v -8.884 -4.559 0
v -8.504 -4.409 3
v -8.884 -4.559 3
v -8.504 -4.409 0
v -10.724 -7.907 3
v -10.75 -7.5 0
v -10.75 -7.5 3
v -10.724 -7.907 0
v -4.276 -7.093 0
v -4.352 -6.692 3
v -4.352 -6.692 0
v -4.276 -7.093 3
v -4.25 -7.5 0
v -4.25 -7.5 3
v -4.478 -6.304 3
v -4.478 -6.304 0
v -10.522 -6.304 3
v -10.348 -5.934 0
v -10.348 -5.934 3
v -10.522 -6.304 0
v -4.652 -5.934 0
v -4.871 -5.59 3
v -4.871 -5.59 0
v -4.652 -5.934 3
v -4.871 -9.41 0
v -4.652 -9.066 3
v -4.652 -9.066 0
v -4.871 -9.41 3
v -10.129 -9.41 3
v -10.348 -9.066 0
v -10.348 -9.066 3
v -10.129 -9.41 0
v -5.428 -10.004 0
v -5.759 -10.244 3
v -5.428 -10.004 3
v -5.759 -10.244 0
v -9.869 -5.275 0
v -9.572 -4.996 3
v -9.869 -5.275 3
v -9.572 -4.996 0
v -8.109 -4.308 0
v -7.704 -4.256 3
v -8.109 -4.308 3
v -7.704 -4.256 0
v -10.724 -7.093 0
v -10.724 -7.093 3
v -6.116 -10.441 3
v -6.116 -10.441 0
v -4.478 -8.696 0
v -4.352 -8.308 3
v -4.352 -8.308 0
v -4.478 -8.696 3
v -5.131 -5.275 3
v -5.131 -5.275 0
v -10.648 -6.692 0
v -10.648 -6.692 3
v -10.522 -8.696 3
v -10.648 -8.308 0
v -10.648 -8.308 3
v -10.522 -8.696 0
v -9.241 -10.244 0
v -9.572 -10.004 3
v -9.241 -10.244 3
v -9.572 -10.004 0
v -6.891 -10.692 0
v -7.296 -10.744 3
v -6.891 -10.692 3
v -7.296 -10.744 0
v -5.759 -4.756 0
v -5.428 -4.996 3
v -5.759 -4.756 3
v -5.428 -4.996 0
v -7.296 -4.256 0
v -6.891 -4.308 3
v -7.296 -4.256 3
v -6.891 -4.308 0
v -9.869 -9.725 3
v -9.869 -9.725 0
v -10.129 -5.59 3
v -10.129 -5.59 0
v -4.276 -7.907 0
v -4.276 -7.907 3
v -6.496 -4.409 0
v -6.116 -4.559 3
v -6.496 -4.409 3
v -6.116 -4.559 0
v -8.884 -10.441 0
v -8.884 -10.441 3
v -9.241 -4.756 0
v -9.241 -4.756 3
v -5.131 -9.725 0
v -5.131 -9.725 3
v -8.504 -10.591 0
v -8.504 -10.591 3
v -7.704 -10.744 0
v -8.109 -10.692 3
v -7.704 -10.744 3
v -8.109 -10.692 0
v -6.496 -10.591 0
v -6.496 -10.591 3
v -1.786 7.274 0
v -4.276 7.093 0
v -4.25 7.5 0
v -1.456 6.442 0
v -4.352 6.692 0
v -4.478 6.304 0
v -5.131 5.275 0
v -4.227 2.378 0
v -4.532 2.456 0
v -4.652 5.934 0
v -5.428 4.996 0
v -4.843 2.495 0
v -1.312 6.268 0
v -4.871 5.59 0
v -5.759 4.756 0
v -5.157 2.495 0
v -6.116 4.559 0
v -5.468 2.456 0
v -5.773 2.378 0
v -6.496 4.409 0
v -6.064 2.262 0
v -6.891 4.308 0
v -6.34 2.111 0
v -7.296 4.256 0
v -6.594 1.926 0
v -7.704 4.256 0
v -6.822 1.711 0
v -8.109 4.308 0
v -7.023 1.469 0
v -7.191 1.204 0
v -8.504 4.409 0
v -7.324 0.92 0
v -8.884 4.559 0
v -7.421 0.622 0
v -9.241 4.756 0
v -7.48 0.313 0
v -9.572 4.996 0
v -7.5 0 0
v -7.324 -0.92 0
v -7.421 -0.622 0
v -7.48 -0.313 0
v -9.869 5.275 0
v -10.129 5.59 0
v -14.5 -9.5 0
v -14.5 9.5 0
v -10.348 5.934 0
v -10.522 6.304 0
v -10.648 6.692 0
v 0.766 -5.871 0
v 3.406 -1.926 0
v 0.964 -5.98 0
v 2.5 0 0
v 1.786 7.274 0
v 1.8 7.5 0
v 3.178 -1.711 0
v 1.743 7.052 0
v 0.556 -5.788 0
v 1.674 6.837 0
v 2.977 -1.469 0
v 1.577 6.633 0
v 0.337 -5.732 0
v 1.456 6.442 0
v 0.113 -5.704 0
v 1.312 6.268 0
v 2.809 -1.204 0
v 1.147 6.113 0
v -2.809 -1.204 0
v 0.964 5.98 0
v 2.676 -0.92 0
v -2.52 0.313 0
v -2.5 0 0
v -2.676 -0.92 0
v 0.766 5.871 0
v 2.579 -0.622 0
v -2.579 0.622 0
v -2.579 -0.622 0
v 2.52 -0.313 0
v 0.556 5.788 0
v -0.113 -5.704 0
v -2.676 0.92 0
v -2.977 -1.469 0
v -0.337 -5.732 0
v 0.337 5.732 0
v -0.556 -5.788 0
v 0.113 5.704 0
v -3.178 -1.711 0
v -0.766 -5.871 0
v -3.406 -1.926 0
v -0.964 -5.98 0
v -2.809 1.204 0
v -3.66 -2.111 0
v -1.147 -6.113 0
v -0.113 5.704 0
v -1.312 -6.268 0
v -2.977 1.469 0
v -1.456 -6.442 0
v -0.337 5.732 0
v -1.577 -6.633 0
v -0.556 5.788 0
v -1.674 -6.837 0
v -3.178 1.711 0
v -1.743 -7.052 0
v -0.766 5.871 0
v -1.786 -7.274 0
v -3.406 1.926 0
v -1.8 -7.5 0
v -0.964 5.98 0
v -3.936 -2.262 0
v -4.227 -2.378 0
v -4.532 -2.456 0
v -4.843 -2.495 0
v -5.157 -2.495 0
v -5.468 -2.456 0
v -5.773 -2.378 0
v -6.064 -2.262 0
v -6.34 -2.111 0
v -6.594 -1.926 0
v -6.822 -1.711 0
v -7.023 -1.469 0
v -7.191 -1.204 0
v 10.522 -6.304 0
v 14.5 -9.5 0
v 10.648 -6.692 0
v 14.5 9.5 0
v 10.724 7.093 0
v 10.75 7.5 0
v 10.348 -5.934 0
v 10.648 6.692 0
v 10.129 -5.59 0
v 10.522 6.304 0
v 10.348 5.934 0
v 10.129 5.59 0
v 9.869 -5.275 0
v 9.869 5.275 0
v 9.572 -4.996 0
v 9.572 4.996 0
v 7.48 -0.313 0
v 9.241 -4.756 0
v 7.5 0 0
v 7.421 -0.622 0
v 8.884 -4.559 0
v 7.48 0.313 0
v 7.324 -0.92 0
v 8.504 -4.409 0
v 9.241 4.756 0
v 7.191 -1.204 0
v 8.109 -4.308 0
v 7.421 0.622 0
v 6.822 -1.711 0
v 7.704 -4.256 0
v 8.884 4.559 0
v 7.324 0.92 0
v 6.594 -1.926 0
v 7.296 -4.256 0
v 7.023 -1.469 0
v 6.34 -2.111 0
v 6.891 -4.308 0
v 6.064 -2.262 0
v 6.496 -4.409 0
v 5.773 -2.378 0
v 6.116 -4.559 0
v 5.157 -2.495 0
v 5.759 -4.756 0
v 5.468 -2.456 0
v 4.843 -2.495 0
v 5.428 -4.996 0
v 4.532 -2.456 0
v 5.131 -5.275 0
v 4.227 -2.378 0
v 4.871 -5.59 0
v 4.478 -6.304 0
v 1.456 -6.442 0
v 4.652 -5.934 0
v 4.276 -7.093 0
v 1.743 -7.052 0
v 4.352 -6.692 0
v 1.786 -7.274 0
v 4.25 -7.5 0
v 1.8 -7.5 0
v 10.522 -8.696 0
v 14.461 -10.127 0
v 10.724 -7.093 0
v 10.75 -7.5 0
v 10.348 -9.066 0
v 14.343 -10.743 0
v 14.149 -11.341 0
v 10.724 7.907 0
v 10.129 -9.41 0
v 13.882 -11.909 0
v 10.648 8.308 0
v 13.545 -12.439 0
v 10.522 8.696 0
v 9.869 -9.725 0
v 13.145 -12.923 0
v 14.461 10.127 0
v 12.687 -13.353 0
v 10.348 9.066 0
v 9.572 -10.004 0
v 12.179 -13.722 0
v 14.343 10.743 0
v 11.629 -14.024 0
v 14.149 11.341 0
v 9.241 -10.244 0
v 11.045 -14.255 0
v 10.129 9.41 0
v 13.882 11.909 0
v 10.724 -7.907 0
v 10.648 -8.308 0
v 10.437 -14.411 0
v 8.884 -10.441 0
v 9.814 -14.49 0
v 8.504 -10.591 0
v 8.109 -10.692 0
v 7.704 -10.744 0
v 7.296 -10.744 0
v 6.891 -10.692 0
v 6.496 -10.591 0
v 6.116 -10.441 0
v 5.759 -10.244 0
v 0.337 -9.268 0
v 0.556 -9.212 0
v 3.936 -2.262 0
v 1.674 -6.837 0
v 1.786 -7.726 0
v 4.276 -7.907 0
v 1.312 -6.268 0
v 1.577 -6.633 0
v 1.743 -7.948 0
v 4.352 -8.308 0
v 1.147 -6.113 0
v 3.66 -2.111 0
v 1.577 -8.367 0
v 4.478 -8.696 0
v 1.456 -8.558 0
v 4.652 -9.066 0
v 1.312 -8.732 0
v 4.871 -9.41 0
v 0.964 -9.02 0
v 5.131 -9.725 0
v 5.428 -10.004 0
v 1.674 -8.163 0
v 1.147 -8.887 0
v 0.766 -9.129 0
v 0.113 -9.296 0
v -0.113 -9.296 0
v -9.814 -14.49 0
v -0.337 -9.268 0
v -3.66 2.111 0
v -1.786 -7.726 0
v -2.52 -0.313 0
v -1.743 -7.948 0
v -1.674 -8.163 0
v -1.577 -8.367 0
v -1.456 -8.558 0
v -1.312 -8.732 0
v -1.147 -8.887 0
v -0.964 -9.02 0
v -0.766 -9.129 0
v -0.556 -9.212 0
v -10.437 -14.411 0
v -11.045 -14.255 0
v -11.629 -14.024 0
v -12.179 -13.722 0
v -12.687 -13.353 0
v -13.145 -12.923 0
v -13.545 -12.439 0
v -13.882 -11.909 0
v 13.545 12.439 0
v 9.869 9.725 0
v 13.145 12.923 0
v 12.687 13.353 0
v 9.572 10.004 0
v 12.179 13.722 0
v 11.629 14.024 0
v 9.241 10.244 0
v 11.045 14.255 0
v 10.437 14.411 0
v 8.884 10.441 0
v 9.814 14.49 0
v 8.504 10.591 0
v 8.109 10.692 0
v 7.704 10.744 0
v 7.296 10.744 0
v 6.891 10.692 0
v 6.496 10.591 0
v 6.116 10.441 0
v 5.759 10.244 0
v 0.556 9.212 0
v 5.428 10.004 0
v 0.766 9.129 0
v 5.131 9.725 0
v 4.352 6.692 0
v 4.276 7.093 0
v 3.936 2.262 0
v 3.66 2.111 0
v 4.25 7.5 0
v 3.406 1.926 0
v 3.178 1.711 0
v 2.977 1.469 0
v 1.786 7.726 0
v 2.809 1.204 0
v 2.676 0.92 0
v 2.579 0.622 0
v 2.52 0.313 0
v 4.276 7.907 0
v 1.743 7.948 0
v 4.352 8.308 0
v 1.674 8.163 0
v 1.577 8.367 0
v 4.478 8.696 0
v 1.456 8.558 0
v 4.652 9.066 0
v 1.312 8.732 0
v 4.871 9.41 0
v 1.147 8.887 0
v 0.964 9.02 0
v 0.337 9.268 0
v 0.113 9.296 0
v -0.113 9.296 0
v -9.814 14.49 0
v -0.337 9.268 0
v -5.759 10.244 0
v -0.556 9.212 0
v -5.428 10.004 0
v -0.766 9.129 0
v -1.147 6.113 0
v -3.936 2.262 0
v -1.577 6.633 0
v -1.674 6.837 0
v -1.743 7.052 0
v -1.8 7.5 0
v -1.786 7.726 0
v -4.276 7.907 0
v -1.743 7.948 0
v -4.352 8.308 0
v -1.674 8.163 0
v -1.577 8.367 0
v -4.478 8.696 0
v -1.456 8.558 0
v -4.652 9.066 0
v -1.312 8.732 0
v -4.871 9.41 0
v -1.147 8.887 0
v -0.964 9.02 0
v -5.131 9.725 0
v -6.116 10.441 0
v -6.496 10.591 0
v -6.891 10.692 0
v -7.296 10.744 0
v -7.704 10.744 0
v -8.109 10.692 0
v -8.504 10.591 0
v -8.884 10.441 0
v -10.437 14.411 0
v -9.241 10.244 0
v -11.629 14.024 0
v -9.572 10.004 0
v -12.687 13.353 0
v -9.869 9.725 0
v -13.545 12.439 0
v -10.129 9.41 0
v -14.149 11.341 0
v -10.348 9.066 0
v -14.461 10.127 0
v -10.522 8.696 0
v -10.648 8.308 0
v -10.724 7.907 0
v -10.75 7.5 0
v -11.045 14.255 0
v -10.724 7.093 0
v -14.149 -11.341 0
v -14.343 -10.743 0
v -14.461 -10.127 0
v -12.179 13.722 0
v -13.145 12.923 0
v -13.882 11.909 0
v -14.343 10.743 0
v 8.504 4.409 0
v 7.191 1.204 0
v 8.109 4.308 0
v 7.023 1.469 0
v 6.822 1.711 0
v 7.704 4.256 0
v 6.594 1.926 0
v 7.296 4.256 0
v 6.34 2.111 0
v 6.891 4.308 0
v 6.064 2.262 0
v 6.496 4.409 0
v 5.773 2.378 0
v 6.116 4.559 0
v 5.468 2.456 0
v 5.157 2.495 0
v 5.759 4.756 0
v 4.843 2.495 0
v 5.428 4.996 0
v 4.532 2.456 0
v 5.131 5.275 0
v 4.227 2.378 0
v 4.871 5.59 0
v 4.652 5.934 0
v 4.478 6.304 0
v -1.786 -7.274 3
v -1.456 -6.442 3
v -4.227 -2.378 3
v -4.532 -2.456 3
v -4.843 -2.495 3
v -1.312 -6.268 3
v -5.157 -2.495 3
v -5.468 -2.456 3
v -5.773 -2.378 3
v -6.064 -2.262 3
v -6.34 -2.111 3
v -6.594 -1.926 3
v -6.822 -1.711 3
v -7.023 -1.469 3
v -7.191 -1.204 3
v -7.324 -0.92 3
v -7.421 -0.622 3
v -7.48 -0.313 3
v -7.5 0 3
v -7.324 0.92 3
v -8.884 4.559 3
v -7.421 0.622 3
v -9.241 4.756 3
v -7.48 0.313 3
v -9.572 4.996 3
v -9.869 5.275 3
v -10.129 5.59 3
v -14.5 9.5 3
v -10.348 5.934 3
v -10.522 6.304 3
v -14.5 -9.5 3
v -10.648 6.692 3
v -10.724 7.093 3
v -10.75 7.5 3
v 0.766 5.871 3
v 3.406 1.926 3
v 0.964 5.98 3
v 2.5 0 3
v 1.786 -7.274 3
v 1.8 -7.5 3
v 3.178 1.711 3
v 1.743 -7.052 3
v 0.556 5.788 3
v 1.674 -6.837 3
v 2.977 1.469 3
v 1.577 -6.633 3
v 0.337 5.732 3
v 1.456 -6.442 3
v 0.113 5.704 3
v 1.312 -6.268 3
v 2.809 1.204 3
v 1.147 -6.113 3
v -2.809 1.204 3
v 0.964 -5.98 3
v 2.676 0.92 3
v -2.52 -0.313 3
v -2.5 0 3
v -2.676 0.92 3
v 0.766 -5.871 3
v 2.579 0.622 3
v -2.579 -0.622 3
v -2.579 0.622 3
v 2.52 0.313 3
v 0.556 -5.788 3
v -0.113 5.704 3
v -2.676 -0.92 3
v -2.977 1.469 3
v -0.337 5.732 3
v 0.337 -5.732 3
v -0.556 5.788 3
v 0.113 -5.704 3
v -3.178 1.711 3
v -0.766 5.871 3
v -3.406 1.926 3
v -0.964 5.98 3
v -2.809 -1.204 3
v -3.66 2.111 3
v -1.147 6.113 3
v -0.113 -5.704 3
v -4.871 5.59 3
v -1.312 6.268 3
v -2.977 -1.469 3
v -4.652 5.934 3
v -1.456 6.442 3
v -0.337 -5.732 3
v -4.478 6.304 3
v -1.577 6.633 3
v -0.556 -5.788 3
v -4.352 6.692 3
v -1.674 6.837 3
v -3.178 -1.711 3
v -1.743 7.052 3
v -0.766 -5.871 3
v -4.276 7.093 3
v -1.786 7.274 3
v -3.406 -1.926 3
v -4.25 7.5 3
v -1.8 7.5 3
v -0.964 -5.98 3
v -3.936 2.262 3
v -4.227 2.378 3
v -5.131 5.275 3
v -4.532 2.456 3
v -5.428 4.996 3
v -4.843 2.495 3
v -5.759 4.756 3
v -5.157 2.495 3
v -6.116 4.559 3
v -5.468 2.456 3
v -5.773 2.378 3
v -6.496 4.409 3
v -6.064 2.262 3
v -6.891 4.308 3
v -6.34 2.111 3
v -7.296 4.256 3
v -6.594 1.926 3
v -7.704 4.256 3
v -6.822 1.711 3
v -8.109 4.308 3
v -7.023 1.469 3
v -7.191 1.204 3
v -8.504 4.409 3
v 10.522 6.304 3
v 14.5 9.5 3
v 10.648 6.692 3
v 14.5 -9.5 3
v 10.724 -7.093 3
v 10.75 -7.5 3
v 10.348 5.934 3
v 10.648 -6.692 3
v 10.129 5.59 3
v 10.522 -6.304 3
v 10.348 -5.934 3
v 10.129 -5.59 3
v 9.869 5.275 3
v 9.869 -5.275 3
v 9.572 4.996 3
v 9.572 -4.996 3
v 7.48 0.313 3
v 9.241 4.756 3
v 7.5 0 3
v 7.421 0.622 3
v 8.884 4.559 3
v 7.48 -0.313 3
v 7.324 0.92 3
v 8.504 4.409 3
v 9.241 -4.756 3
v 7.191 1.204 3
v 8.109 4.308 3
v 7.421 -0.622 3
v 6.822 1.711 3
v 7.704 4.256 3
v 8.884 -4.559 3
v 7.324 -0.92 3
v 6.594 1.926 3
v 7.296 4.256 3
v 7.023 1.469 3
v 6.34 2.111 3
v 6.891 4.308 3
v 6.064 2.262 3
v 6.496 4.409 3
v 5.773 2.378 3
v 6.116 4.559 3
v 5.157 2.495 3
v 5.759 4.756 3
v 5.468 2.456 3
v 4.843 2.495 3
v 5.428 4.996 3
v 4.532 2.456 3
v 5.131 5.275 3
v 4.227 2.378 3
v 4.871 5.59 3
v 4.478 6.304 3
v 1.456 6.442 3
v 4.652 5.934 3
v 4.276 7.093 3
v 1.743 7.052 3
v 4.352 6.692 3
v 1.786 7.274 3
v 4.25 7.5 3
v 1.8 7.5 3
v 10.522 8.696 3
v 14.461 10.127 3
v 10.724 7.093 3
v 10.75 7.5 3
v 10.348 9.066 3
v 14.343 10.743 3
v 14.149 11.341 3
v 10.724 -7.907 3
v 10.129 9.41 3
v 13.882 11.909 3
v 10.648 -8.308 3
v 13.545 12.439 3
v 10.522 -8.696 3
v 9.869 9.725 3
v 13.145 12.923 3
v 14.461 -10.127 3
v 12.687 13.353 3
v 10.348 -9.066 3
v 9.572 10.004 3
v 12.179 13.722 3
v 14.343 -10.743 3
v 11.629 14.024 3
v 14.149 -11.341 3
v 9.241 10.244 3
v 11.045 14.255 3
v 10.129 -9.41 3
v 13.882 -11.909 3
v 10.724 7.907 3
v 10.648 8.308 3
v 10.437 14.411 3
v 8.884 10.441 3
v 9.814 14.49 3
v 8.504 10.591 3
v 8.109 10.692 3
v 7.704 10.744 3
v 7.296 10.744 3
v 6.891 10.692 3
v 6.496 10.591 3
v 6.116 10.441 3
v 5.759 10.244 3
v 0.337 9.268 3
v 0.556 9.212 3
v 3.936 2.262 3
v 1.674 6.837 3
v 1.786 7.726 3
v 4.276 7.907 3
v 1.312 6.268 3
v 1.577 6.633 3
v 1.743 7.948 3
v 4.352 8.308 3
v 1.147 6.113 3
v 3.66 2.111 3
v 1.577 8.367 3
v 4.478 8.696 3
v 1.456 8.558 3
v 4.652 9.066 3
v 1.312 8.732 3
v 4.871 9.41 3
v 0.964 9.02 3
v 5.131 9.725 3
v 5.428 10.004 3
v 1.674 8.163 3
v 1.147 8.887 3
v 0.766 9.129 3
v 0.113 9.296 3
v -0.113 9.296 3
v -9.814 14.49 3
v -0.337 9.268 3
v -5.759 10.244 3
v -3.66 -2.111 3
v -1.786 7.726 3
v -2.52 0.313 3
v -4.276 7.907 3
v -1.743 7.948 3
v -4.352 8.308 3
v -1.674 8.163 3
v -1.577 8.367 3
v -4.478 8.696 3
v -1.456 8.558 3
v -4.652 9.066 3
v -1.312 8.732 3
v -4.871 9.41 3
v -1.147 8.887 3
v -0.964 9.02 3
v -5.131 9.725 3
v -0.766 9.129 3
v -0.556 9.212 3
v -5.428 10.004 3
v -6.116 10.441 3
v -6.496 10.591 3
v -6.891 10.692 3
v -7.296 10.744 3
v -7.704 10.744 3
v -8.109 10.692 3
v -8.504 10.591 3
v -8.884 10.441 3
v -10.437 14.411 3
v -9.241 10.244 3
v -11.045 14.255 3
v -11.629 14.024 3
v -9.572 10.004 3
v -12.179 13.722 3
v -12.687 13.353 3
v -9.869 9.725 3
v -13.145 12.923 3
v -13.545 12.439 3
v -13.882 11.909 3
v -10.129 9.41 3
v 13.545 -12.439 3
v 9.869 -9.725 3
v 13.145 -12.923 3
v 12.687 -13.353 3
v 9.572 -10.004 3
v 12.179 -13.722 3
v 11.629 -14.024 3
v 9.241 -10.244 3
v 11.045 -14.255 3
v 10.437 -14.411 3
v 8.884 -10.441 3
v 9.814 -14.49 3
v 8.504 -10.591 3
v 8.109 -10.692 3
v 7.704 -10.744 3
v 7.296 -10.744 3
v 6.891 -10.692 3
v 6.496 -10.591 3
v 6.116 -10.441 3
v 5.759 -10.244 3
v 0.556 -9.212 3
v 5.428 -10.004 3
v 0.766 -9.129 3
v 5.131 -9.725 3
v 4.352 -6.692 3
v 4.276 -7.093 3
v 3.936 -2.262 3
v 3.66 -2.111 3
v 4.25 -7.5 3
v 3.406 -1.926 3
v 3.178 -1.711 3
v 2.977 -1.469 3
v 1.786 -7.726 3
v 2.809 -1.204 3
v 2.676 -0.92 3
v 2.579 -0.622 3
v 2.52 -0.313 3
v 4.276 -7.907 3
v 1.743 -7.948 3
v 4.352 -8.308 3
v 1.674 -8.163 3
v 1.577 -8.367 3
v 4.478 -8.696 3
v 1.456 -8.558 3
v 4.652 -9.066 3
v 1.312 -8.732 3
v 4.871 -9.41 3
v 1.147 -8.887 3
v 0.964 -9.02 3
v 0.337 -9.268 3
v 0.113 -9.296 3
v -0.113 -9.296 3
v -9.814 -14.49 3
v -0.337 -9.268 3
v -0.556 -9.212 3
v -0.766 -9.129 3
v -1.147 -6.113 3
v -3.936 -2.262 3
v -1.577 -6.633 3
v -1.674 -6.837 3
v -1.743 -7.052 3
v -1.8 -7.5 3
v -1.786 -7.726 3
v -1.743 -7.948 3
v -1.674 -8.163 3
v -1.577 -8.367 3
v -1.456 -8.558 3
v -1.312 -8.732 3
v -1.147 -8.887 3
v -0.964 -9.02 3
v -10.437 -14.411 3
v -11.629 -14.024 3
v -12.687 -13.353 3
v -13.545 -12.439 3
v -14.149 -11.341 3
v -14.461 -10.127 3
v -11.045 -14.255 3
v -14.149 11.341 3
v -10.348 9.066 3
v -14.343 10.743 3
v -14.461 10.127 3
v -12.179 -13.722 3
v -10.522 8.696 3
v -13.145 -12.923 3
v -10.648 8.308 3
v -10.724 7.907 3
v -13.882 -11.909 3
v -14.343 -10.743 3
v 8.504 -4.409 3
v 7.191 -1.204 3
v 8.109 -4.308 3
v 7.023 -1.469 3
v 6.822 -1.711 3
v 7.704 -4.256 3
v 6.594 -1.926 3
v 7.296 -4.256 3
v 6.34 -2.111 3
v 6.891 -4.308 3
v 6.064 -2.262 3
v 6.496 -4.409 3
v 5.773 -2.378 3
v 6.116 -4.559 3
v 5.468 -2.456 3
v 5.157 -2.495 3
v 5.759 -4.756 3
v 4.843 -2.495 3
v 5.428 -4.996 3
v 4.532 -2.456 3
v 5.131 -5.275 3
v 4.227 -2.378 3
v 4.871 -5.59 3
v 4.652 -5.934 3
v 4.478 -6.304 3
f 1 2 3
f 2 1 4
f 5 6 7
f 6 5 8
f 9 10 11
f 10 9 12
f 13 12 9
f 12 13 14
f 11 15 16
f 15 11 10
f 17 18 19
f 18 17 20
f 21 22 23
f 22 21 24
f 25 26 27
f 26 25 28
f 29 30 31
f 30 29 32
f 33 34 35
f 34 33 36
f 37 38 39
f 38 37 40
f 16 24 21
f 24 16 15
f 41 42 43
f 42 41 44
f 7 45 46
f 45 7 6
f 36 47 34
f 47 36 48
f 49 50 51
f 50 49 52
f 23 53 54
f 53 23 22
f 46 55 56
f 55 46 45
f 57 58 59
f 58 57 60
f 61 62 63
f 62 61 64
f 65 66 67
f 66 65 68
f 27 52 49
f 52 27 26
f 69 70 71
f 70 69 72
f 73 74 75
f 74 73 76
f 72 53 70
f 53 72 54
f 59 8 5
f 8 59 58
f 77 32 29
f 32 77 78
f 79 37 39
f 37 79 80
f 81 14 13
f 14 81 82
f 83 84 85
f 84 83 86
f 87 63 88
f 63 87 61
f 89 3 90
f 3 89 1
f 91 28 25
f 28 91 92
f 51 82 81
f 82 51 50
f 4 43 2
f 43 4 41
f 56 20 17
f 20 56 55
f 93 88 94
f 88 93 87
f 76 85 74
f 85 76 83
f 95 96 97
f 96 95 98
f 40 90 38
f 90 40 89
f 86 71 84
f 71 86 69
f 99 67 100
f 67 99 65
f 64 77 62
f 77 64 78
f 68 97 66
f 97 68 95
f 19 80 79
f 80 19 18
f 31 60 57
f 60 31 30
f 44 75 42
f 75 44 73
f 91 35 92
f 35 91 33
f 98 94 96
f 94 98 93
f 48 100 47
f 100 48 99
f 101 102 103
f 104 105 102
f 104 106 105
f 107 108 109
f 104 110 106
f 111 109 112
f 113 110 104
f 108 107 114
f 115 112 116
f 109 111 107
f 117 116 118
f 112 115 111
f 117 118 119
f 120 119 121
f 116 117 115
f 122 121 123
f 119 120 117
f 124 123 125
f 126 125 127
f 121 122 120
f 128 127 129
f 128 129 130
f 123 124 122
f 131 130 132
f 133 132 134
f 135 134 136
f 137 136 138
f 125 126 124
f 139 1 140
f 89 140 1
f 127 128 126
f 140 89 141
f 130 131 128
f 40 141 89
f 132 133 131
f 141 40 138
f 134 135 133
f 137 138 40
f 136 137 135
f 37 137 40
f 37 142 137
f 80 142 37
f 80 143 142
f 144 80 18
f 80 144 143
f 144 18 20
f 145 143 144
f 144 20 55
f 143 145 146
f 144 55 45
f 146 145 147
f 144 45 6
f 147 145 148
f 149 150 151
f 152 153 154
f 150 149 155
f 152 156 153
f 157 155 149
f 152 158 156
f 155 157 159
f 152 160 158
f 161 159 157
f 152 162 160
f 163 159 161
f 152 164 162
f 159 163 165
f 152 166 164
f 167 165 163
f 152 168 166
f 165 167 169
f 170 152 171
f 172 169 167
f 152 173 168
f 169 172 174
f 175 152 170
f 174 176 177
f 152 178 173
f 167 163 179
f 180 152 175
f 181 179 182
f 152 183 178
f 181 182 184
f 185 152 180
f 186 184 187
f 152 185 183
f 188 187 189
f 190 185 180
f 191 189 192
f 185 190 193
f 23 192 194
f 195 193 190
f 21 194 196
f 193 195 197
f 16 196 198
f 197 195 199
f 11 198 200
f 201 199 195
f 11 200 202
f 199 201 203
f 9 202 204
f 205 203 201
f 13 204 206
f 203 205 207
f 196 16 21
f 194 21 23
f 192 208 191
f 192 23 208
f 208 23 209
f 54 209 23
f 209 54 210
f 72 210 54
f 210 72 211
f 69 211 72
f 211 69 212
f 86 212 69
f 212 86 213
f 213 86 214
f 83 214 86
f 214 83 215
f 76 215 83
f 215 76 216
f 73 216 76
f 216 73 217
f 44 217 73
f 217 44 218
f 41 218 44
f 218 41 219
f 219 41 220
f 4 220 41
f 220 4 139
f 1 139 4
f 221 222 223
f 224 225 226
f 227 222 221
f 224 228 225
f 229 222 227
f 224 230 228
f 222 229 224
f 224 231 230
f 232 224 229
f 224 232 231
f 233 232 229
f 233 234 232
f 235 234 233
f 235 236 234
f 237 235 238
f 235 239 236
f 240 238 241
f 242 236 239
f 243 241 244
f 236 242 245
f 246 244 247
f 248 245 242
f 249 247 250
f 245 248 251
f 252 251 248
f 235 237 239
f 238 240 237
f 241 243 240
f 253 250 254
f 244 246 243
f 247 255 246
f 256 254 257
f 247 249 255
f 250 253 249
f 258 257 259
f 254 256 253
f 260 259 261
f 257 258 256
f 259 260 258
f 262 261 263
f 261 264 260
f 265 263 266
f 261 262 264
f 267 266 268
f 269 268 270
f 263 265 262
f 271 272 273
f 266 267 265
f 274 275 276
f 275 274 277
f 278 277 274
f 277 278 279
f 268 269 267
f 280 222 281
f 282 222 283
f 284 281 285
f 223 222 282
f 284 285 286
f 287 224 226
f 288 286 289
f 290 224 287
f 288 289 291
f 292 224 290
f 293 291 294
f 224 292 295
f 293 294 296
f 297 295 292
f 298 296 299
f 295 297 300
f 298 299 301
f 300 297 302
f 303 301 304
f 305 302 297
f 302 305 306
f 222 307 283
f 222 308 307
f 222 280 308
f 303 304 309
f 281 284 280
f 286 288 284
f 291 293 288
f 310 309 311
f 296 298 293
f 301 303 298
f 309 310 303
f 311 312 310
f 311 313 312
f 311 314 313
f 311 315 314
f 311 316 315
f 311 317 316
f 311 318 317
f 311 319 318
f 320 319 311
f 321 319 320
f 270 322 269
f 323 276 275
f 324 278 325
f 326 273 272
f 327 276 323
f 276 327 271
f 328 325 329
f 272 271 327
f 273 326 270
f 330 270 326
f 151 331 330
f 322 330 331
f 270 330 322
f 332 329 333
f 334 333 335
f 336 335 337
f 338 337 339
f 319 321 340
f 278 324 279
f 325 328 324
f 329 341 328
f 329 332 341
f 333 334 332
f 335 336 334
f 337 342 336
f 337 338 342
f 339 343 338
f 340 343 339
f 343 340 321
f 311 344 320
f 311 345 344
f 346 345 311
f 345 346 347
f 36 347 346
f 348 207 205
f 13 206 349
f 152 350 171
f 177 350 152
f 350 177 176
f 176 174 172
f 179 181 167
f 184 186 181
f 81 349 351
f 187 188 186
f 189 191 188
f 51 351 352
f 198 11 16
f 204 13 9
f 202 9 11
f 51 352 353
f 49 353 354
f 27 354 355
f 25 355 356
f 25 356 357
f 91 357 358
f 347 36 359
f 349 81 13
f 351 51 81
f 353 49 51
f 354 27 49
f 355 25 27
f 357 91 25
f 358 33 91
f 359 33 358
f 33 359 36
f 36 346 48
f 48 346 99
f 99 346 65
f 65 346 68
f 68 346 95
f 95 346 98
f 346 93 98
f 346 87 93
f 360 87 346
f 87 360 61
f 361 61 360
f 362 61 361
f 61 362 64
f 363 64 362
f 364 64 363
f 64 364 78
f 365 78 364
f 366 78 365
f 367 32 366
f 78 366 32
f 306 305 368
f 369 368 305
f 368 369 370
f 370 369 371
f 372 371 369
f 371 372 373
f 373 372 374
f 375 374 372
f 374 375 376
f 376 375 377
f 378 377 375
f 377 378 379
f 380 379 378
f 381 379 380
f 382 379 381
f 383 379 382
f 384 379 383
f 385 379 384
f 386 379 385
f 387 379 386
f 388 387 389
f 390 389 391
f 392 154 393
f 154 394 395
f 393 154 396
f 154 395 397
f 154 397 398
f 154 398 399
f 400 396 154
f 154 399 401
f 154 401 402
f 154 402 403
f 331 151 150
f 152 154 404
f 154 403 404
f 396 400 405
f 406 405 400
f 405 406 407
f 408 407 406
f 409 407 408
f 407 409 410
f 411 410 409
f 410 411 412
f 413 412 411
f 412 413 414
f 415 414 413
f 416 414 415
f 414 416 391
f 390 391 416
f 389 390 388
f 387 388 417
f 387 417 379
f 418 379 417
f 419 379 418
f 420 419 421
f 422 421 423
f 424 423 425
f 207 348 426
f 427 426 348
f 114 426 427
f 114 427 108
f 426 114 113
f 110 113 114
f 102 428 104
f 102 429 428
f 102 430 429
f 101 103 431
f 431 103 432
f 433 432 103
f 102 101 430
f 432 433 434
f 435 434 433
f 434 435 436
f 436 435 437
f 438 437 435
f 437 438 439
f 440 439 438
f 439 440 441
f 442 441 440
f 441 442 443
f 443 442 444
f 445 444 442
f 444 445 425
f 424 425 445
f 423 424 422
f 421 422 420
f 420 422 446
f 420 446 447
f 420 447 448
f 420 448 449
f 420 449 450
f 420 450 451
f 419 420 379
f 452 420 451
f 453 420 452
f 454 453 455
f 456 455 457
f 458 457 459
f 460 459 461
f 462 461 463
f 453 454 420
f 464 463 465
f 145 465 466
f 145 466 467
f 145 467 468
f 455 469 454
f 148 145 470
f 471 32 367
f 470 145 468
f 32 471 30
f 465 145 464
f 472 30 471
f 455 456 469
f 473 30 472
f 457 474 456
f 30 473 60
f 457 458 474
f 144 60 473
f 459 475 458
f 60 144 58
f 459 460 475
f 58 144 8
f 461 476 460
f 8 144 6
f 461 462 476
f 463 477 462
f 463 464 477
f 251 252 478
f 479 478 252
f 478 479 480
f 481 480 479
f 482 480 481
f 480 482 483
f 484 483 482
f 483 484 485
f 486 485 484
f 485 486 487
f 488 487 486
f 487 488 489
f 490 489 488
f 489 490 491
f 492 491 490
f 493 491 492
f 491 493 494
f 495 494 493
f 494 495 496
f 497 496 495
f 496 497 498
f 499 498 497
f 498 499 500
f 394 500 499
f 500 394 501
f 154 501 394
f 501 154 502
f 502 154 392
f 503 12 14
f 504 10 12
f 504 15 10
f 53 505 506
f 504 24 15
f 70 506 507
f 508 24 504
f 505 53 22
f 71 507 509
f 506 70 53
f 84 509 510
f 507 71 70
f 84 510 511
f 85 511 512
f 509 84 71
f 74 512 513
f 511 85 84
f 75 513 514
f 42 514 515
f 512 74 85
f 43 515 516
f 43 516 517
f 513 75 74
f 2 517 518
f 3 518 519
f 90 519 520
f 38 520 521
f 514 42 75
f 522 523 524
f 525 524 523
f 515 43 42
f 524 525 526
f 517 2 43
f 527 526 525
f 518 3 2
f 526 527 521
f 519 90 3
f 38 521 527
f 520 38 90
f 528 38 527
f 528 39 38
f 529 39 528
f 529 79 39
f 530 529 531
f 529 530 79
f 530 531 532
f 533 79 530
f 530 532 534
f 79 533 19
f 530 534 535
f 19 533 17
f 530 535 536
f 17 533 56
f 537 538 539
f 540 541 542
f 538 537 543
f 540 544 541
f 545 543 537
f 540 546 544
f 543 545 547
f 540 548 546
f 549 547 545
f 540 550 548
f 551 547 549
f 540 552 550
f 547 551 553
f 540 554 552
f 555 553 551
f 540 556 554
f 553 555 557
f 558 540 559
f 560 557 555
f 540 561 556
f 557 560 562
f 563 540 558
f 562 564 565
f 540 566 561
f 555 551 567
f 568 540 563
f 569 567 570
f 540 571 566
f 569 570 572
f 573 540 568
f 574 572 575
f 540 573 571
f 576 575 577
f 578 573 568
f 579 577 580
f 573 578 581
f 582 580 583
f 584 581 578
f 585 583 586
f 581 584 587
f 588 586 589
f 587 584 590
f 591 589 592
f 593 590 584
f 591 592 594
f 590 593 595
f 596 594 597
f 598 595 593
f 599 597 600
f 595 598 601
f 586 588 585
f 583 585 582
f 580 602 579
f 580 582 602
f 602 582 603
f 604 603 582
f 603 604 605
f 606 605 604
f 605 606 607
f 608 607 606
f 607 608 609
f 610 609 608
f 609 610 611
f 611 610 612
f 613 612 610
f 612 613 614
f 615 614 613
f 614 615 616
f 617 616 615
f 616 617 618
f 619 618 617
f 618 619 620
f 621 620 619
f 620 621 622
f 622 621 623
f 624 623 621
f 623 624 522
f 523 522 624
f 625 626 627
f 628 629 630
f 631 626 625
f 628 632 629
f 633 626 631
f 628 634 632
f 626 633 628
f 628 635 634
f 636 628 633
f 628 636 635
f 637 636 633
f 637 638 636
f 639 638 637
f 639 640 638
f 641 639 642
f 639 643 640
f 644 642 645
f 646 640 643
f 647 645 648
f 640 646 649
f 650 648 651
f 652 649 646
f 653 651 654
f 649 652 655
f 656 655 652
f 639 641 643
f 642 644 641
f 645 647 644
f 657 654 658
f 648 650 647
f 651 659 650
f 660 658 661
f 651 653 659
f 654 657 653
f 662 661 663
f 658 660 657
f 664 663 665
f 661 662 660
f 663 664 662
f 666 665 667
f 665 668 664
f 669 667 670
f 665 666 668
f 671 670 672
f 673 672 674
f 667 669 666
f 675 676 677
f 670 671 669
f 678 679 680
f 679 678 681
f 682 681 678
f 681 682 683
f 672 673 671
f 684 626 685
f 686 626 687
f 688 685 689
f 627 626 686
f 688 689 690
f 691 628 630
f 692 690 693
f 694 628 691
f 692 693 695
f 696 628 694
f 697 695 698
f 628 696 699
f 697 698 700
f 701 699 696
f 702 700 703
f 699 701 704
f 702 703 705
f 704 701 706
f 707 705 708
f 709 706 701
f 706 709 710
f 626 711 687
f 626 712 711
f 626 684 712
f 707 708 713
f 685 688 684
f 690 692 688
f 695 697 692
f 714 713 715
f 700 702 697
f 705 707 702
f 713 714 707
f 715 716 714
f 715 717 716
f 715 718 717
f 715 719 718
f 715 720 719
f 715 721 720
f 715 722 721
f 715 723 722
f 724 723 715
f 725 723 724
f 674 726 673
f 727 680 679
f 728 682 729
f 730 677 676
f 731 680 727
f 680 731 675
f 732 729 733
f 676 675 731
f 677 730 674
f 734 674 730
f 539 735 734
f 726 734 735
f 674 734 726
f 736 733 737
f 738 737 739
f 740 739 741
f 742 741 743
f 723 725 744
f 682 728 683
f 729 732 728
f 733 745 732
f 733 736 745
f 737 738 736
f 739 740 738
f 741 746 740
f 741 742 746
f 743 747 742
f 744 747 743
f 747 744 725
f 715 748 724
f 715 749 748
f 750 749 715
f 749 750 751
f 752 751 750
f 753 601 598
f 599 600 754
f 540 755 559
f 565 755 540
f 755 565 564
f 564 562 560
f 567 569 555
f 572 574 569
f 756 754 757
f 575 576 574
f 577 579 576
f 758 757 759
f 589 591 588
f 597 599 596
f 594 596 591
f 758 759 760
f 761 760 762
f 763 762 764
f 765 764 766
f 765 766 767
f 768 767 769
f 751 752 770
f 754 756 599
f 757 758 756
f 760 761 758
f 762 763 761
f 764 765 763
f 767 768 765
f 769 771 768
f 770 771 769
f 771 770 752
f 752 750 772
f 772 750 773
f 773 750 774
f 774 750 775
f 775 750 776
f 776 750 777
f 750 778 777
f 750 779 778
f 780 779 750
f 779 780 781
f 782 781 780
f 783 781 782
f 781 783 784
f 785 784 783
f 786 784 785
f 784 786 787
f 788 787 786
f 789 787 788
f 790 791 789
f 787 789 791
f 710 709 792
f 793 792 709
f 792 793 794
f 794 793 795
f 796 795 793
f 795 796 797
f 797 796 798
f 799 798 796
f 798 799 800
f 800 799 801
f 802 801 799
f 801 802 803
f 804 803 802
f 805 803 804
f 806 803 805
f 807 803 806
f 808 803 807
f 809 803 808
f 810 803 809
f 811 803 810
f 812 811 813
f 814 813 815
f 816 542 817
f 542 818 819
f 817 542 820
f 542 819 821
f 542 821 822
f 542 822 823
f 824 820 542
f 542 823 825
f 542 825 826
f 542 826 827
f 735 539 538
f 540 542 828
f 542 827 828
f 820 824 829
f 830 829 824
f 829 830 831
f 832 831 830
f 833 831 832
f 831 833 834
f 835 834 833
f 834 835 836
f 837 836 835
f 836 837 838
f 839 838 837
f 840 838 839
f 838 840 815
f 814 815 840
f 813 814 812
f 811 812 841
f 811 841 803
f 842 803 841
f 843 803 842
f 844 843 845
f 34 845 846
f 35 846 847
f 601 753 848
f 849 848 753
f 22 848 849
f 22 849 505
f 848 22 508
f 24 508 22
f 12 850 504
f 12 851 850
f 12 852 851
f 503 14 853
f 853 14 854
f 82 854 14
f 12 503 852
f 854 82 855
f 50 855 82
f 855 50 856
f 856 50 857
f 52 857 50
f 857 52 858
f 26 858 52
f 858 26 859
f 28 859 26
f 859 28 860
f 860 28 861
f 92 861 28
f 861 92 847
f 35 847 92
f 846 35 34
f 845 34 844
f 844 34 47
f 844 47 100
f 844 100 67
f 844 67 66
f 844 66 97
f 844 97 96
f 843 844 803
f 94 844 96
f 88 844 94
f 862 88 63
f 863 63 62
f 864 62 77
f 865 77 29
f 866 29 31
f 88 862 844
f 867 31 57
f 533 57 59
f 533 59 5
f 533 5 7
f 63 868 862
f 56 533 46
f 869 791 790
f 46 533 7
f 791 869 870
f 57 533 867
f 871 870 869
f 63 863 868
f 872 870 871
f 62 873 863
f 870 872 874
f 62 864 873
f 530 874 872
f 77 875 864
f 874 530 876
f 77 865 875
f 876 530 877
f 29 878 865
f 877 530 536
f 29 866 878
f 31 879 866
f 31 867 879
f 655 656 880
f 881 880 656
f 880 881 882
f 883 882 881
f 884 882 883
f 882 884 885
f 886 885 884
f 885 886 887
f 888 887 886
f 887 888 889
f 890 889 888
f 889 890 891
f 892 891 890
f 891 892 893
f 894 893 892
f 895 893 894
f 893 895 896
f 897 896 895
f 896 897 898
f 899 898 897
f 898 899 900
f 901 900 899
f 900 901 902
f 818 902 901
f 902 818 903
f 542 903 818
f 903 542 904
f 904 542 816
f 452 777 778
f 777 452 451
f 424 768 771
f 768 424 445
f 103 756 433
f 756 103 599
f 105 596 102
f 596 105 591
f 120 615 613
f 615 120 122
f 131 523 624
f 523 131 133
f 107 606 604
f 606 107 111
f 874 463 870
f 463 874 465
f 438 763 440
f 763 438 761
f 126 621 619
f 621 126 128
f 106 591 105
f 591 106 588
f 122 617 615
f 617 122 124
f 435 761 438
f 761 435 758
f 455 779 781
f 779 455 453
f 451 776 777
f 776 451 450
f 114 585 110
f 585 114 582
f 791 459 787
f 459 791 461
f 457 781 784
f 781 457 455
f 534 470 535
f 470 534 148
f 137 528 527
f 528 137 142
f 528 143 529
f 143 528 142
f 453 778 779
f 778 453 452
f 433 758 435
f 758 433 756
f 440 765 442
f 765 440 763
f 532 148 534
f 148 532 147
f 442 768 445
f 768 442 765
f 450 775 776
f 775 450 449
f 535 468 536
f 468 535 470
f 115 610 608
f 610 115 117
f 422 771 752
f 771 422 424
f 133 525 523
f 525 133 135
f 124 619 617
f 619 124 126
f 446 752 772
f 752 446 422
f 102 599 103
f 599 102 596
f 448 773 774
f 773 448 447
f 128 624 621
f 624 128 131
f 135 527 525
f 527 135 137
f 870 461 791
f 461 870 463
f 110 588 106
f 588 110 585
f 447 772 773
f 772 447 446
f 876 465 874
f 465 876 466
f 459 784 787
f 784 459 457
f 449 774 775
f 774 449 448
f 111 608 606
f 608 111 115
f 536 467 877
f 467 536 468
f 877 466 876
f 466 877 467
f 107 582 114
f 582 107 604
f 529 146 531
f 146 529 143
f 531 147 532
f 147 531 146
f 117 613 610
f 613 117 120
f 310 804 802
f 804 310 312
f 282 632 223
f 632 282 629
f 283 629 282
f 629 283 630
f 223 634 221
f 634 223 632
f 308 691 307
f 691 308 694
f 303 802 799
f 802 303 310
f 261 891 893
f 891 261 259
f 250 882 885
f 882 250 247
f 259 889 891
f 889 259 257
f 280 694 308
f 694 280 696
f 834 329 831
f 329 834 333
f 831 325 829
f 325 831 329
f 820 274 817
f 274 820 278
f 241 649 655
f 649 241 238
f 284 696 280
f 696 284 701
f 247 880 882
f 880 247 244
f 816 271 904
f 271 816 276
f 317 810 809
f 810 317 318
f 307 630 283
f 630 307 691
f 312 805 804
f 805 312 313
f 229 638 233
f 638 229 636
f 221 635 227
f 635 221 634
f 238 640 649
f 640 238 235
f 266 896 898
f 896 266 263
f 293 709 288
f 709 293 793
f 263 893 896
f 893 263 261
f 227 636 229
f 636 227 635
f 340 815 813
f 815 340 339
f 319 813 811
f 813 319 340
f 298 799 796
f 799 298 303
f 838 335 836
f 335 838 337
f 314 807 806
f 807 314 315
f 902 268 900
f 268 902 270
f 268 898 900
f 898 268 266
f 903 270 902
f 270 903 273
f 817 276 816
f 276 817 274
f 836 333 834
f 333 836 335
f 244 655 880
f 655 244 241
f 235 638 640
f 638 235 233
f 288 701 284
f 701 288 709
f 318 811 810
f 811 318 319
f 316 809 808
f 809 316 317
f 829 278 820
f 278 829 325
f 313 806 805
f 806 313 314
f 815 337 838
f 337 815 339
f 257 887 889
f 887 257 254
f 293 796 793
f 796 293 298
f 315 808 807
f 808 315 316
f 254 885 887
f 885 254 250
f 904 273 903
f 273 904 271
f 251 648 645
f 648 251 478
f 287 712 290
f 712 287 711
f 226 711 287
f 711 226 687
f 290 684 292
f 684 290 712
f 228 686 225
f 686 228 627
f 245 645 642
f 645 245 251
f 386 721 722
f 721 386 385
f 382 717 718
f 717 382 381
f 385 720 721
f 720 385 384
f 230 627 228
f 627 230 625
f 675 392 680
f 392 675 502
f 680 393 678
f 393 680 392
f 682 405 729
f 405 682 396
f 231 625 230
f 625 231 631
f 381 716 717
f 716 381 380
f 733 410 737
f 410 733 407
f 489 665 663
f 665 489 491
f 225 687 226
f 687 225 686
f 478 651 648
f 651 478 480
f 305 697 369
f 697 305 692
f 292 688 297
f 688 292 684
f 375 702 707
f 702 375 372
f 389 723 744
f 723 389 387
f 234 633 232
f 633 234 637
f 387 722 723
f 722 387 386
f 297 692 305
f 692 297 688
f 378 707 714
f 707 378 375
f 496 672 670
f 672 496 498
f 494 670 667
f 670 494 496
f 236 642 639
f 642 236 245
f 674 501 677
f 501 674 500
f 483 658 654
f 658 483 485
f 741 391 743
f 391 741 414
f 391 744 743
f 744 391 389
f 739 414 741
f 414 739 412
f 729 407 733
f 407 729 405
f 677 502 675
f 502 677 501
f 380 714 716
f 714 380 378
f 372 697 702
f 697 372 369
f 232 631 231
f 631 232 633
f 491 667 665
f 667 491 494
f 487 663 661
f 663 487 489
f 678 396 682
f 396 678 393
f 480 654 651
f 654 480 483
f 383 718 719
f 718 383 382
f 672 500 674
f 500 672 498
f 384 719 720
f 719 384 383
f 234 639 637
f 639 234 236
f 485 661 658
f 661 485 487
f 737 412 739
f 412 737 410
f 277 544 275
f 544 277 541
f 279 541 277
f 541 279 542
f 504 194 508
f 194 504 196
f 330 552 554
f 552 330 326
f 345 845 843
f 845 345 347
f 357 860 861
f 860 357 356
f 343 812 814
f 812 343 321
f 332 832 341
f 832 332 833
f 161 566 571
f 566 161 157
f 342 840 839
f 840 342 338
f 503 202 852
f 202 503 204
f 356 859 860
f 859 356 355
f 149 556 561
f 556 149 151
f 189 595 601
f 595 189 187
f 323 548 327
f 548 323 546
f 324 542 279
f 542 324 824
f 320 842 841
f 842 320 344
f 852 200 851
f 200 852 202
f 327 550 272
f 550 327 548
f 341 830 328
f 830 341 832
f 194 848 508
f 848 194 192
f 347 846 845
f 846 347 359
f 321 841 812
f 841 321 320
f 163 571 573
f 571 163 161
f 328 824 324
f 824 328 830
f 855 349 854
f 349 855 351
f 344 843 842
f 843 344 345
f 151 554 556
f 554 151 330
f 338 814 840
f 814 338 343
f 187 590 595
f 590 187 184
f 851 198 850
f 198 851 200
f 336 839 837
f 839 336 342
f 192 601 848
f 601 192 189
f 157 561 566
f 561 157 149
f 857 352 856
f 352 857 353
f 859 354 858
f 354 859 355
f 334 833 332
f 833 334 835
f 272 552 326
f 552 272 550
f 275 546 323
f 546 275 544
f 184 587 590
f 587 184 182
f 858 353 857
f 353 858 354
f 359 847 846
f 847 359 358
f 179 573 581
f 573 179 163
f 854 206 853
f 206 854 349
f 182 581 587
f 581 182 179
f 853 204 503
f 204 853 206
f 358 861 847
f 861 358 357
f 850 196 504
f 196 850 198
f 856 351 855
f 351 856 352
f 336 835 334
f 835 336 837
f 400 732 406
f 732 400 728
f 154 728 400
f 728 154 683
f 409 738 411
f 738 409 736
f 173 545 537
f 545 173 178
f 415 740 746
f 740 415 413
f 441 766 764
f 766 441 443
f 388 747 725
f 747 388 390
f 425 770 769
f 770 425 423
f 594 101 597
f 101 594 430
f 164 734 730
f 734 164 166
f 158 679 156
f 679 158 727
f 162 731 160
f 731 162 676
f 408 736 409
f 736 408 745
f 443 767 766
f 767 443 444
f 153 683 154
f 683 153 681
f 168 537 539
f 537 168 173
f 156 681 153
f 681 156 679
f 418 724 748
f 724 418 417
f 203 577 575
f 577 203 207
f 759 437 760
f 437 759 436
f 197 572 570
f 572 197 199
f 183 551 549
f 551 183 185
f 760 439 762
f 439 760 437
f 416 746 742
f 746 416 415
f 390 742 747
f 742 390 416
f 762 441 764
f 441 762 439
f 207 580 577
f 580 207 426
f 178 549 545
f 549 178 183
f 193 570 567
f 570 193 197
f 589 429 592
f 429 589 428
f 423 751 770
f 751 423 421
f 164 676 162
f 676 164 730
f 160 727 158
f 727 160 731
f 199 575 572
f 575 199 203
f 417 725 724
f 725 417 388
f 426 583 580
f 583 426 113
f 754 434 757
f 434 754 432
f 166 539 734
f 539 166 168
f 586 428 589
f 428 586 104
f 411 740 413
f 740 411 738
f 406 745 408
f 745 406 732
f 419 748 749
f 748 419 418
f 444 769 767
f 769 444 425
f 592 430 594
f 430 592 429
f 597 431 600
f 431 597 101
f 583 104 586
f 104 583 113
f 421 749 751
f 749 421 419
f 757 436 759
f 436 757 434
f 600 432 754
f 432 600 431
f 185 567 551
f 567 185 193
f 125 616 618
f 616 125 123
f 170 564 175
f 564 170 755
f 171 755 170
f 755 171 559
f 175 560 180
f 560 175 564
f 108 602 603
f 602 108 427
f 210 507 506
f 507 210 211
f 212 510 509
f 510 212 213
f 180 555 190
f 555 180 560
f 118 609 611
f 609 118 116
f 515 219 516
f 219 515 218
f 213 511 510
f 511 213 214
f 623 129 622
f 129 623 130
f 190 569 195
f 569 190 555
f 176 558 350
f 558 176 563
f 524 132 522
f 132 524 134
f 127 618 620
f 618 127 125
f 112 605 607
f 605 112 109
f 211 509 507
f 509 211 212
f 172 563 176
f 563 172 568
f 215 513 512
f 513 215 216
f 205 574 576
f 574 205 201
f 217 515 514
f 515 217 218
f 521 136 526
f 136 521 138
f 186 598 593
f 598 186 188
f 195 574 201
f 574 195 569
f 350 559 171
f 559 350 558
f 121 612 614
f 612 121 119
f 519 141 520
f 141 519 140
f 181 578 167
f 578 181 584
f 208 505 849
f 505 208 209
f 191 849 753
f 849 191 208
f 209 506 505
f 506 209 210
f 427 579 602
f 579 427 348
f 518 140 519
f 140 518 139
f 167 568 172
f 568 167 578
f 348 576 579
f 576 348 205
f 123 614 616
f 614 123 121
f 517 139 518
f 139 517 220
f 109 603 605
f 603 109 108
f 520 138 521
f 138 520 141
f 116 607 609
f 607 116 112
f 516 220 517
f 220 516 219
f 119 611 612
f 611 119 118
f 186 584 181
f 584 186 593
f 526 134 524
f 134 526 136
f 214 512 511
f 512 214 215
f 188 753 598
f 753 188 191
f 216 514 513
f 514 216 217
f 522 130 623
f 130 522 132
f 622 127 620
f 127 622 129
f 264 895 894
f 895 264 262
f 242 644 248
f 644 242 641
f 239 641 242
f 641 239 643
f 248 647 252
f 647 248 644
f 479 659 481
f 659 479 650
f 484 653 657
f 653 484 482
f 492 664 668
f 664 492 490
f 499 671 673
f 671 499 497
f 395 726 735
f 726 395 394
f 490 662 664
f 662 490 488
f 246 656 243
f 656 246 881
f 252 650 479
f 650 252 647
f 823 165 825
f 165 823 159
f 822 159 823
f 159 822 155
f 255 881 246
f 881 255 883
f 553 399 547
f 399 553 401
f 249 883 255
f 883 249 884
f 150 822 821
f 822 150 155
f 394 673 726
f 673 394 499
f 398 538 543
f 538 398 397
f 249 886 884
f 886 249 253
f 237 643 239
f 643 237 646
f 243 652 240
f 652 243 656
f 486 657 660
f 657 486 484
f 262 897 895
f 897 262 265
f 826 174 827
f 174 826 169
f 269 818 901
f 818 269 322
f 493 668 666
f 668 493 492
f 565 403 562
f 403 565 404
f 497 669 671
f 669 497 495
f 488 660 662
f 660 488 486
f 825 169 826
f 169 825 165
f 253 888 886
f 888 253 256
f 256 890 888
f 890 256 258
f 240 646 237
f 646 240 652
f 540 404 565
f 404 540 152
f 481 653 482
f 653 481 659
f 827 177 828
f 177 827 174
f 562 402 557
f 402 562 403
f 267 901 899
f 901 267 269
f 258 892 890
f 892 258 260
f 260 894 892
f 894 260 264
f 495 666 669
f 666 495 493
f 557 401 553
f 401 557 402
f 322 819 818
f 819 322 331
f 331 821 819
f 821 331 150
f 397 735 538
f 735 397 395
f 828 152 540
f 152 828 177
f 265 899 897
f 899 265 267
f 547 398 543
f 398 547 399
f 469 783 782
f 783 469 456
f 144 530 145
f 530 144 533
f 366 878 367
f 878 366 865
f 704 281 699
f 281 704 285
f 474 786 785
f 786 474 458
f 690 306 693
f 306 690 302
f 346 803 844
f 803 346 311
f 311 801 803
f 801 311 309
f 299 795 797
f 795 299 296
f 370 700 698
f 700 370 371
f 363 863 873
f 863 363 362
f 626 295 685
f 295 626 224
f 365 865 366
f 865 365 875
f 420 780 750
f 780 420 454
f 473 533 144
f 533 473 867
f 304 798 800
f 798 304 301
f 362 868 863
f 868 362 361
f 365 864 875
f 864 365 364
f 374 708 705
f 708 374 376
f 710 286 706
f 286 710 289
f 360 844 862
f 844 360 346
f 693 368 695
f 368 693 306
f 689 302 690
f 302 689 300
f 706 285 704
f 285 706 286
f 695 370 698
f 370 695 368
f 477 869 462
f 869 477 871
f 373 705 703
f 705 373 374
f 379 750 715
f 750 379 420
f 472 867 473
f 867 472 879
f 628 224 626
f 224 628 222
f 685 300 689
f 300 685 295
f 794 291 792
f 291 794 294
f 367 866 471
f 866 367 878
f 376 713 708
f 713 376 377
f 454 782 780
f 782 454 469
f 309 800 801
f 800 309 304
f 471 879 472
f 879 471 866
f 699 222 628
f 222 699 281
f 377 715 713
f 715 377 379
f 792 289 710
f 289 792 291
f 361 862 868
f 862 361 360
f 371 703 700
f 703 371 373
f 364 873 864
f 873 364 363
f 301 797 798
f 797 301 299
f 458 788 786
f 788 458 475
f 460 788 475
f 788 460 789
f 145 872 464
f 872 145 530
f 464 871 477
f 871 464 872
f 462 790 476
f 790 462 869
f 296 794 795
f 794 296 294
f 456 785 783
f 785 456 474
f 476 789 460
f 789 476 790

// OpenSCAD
$fn = 50;

difference() {
	union() {
		hull() {
			translate(v = [-9.5, 9.5, 0]) {
				cylinder(h = 3, r = 5);
			}
			translate(v = [9.5, 9.5, 0]) {
				cylinder(h = 3, r = 5);
			}
			translate(v = [-9.5, -9.5, 0]) {
				cylinder(h = 3, r = 5);
			}
			translate(v = [9.5, -9.5, 0]) {
				cylinder(h = 3, r = 5);
			}
		}
	}
	union() {
		translate(v = [-7.5, -7.5, 0]) {
			cylinder(h = 3, r = 3.25);
		}
		translate(v = [-7.5, 7.5, 0]) {
			cylinder(h = 3, r = 3.25);
		}
		translate(v = [7.5, -7.5, 0]) {
			cylinder(h = 3, r = 3.25);
		}
		translate(v = [7.5, 7.5, 0]) {
			cylinder(h = 3, r = 3.25);
		}
		translate(v = [0.0, -7.5, 0]) {
			cylinder(h = 3, r = 1.8);
		}
		translate(v = [0.0, 7.5, 0]) {
			cylinder(h = 3, r = 1.8);
		}
		translate(v = [-5.0, 0, 0.0]) {
			cylinder(h = 3, r = 2.5);
		}
		translate(v = [5.0, 0, 0.0]) {
			cylinder(h = 3, r = 2.5);
		}
	}
}
